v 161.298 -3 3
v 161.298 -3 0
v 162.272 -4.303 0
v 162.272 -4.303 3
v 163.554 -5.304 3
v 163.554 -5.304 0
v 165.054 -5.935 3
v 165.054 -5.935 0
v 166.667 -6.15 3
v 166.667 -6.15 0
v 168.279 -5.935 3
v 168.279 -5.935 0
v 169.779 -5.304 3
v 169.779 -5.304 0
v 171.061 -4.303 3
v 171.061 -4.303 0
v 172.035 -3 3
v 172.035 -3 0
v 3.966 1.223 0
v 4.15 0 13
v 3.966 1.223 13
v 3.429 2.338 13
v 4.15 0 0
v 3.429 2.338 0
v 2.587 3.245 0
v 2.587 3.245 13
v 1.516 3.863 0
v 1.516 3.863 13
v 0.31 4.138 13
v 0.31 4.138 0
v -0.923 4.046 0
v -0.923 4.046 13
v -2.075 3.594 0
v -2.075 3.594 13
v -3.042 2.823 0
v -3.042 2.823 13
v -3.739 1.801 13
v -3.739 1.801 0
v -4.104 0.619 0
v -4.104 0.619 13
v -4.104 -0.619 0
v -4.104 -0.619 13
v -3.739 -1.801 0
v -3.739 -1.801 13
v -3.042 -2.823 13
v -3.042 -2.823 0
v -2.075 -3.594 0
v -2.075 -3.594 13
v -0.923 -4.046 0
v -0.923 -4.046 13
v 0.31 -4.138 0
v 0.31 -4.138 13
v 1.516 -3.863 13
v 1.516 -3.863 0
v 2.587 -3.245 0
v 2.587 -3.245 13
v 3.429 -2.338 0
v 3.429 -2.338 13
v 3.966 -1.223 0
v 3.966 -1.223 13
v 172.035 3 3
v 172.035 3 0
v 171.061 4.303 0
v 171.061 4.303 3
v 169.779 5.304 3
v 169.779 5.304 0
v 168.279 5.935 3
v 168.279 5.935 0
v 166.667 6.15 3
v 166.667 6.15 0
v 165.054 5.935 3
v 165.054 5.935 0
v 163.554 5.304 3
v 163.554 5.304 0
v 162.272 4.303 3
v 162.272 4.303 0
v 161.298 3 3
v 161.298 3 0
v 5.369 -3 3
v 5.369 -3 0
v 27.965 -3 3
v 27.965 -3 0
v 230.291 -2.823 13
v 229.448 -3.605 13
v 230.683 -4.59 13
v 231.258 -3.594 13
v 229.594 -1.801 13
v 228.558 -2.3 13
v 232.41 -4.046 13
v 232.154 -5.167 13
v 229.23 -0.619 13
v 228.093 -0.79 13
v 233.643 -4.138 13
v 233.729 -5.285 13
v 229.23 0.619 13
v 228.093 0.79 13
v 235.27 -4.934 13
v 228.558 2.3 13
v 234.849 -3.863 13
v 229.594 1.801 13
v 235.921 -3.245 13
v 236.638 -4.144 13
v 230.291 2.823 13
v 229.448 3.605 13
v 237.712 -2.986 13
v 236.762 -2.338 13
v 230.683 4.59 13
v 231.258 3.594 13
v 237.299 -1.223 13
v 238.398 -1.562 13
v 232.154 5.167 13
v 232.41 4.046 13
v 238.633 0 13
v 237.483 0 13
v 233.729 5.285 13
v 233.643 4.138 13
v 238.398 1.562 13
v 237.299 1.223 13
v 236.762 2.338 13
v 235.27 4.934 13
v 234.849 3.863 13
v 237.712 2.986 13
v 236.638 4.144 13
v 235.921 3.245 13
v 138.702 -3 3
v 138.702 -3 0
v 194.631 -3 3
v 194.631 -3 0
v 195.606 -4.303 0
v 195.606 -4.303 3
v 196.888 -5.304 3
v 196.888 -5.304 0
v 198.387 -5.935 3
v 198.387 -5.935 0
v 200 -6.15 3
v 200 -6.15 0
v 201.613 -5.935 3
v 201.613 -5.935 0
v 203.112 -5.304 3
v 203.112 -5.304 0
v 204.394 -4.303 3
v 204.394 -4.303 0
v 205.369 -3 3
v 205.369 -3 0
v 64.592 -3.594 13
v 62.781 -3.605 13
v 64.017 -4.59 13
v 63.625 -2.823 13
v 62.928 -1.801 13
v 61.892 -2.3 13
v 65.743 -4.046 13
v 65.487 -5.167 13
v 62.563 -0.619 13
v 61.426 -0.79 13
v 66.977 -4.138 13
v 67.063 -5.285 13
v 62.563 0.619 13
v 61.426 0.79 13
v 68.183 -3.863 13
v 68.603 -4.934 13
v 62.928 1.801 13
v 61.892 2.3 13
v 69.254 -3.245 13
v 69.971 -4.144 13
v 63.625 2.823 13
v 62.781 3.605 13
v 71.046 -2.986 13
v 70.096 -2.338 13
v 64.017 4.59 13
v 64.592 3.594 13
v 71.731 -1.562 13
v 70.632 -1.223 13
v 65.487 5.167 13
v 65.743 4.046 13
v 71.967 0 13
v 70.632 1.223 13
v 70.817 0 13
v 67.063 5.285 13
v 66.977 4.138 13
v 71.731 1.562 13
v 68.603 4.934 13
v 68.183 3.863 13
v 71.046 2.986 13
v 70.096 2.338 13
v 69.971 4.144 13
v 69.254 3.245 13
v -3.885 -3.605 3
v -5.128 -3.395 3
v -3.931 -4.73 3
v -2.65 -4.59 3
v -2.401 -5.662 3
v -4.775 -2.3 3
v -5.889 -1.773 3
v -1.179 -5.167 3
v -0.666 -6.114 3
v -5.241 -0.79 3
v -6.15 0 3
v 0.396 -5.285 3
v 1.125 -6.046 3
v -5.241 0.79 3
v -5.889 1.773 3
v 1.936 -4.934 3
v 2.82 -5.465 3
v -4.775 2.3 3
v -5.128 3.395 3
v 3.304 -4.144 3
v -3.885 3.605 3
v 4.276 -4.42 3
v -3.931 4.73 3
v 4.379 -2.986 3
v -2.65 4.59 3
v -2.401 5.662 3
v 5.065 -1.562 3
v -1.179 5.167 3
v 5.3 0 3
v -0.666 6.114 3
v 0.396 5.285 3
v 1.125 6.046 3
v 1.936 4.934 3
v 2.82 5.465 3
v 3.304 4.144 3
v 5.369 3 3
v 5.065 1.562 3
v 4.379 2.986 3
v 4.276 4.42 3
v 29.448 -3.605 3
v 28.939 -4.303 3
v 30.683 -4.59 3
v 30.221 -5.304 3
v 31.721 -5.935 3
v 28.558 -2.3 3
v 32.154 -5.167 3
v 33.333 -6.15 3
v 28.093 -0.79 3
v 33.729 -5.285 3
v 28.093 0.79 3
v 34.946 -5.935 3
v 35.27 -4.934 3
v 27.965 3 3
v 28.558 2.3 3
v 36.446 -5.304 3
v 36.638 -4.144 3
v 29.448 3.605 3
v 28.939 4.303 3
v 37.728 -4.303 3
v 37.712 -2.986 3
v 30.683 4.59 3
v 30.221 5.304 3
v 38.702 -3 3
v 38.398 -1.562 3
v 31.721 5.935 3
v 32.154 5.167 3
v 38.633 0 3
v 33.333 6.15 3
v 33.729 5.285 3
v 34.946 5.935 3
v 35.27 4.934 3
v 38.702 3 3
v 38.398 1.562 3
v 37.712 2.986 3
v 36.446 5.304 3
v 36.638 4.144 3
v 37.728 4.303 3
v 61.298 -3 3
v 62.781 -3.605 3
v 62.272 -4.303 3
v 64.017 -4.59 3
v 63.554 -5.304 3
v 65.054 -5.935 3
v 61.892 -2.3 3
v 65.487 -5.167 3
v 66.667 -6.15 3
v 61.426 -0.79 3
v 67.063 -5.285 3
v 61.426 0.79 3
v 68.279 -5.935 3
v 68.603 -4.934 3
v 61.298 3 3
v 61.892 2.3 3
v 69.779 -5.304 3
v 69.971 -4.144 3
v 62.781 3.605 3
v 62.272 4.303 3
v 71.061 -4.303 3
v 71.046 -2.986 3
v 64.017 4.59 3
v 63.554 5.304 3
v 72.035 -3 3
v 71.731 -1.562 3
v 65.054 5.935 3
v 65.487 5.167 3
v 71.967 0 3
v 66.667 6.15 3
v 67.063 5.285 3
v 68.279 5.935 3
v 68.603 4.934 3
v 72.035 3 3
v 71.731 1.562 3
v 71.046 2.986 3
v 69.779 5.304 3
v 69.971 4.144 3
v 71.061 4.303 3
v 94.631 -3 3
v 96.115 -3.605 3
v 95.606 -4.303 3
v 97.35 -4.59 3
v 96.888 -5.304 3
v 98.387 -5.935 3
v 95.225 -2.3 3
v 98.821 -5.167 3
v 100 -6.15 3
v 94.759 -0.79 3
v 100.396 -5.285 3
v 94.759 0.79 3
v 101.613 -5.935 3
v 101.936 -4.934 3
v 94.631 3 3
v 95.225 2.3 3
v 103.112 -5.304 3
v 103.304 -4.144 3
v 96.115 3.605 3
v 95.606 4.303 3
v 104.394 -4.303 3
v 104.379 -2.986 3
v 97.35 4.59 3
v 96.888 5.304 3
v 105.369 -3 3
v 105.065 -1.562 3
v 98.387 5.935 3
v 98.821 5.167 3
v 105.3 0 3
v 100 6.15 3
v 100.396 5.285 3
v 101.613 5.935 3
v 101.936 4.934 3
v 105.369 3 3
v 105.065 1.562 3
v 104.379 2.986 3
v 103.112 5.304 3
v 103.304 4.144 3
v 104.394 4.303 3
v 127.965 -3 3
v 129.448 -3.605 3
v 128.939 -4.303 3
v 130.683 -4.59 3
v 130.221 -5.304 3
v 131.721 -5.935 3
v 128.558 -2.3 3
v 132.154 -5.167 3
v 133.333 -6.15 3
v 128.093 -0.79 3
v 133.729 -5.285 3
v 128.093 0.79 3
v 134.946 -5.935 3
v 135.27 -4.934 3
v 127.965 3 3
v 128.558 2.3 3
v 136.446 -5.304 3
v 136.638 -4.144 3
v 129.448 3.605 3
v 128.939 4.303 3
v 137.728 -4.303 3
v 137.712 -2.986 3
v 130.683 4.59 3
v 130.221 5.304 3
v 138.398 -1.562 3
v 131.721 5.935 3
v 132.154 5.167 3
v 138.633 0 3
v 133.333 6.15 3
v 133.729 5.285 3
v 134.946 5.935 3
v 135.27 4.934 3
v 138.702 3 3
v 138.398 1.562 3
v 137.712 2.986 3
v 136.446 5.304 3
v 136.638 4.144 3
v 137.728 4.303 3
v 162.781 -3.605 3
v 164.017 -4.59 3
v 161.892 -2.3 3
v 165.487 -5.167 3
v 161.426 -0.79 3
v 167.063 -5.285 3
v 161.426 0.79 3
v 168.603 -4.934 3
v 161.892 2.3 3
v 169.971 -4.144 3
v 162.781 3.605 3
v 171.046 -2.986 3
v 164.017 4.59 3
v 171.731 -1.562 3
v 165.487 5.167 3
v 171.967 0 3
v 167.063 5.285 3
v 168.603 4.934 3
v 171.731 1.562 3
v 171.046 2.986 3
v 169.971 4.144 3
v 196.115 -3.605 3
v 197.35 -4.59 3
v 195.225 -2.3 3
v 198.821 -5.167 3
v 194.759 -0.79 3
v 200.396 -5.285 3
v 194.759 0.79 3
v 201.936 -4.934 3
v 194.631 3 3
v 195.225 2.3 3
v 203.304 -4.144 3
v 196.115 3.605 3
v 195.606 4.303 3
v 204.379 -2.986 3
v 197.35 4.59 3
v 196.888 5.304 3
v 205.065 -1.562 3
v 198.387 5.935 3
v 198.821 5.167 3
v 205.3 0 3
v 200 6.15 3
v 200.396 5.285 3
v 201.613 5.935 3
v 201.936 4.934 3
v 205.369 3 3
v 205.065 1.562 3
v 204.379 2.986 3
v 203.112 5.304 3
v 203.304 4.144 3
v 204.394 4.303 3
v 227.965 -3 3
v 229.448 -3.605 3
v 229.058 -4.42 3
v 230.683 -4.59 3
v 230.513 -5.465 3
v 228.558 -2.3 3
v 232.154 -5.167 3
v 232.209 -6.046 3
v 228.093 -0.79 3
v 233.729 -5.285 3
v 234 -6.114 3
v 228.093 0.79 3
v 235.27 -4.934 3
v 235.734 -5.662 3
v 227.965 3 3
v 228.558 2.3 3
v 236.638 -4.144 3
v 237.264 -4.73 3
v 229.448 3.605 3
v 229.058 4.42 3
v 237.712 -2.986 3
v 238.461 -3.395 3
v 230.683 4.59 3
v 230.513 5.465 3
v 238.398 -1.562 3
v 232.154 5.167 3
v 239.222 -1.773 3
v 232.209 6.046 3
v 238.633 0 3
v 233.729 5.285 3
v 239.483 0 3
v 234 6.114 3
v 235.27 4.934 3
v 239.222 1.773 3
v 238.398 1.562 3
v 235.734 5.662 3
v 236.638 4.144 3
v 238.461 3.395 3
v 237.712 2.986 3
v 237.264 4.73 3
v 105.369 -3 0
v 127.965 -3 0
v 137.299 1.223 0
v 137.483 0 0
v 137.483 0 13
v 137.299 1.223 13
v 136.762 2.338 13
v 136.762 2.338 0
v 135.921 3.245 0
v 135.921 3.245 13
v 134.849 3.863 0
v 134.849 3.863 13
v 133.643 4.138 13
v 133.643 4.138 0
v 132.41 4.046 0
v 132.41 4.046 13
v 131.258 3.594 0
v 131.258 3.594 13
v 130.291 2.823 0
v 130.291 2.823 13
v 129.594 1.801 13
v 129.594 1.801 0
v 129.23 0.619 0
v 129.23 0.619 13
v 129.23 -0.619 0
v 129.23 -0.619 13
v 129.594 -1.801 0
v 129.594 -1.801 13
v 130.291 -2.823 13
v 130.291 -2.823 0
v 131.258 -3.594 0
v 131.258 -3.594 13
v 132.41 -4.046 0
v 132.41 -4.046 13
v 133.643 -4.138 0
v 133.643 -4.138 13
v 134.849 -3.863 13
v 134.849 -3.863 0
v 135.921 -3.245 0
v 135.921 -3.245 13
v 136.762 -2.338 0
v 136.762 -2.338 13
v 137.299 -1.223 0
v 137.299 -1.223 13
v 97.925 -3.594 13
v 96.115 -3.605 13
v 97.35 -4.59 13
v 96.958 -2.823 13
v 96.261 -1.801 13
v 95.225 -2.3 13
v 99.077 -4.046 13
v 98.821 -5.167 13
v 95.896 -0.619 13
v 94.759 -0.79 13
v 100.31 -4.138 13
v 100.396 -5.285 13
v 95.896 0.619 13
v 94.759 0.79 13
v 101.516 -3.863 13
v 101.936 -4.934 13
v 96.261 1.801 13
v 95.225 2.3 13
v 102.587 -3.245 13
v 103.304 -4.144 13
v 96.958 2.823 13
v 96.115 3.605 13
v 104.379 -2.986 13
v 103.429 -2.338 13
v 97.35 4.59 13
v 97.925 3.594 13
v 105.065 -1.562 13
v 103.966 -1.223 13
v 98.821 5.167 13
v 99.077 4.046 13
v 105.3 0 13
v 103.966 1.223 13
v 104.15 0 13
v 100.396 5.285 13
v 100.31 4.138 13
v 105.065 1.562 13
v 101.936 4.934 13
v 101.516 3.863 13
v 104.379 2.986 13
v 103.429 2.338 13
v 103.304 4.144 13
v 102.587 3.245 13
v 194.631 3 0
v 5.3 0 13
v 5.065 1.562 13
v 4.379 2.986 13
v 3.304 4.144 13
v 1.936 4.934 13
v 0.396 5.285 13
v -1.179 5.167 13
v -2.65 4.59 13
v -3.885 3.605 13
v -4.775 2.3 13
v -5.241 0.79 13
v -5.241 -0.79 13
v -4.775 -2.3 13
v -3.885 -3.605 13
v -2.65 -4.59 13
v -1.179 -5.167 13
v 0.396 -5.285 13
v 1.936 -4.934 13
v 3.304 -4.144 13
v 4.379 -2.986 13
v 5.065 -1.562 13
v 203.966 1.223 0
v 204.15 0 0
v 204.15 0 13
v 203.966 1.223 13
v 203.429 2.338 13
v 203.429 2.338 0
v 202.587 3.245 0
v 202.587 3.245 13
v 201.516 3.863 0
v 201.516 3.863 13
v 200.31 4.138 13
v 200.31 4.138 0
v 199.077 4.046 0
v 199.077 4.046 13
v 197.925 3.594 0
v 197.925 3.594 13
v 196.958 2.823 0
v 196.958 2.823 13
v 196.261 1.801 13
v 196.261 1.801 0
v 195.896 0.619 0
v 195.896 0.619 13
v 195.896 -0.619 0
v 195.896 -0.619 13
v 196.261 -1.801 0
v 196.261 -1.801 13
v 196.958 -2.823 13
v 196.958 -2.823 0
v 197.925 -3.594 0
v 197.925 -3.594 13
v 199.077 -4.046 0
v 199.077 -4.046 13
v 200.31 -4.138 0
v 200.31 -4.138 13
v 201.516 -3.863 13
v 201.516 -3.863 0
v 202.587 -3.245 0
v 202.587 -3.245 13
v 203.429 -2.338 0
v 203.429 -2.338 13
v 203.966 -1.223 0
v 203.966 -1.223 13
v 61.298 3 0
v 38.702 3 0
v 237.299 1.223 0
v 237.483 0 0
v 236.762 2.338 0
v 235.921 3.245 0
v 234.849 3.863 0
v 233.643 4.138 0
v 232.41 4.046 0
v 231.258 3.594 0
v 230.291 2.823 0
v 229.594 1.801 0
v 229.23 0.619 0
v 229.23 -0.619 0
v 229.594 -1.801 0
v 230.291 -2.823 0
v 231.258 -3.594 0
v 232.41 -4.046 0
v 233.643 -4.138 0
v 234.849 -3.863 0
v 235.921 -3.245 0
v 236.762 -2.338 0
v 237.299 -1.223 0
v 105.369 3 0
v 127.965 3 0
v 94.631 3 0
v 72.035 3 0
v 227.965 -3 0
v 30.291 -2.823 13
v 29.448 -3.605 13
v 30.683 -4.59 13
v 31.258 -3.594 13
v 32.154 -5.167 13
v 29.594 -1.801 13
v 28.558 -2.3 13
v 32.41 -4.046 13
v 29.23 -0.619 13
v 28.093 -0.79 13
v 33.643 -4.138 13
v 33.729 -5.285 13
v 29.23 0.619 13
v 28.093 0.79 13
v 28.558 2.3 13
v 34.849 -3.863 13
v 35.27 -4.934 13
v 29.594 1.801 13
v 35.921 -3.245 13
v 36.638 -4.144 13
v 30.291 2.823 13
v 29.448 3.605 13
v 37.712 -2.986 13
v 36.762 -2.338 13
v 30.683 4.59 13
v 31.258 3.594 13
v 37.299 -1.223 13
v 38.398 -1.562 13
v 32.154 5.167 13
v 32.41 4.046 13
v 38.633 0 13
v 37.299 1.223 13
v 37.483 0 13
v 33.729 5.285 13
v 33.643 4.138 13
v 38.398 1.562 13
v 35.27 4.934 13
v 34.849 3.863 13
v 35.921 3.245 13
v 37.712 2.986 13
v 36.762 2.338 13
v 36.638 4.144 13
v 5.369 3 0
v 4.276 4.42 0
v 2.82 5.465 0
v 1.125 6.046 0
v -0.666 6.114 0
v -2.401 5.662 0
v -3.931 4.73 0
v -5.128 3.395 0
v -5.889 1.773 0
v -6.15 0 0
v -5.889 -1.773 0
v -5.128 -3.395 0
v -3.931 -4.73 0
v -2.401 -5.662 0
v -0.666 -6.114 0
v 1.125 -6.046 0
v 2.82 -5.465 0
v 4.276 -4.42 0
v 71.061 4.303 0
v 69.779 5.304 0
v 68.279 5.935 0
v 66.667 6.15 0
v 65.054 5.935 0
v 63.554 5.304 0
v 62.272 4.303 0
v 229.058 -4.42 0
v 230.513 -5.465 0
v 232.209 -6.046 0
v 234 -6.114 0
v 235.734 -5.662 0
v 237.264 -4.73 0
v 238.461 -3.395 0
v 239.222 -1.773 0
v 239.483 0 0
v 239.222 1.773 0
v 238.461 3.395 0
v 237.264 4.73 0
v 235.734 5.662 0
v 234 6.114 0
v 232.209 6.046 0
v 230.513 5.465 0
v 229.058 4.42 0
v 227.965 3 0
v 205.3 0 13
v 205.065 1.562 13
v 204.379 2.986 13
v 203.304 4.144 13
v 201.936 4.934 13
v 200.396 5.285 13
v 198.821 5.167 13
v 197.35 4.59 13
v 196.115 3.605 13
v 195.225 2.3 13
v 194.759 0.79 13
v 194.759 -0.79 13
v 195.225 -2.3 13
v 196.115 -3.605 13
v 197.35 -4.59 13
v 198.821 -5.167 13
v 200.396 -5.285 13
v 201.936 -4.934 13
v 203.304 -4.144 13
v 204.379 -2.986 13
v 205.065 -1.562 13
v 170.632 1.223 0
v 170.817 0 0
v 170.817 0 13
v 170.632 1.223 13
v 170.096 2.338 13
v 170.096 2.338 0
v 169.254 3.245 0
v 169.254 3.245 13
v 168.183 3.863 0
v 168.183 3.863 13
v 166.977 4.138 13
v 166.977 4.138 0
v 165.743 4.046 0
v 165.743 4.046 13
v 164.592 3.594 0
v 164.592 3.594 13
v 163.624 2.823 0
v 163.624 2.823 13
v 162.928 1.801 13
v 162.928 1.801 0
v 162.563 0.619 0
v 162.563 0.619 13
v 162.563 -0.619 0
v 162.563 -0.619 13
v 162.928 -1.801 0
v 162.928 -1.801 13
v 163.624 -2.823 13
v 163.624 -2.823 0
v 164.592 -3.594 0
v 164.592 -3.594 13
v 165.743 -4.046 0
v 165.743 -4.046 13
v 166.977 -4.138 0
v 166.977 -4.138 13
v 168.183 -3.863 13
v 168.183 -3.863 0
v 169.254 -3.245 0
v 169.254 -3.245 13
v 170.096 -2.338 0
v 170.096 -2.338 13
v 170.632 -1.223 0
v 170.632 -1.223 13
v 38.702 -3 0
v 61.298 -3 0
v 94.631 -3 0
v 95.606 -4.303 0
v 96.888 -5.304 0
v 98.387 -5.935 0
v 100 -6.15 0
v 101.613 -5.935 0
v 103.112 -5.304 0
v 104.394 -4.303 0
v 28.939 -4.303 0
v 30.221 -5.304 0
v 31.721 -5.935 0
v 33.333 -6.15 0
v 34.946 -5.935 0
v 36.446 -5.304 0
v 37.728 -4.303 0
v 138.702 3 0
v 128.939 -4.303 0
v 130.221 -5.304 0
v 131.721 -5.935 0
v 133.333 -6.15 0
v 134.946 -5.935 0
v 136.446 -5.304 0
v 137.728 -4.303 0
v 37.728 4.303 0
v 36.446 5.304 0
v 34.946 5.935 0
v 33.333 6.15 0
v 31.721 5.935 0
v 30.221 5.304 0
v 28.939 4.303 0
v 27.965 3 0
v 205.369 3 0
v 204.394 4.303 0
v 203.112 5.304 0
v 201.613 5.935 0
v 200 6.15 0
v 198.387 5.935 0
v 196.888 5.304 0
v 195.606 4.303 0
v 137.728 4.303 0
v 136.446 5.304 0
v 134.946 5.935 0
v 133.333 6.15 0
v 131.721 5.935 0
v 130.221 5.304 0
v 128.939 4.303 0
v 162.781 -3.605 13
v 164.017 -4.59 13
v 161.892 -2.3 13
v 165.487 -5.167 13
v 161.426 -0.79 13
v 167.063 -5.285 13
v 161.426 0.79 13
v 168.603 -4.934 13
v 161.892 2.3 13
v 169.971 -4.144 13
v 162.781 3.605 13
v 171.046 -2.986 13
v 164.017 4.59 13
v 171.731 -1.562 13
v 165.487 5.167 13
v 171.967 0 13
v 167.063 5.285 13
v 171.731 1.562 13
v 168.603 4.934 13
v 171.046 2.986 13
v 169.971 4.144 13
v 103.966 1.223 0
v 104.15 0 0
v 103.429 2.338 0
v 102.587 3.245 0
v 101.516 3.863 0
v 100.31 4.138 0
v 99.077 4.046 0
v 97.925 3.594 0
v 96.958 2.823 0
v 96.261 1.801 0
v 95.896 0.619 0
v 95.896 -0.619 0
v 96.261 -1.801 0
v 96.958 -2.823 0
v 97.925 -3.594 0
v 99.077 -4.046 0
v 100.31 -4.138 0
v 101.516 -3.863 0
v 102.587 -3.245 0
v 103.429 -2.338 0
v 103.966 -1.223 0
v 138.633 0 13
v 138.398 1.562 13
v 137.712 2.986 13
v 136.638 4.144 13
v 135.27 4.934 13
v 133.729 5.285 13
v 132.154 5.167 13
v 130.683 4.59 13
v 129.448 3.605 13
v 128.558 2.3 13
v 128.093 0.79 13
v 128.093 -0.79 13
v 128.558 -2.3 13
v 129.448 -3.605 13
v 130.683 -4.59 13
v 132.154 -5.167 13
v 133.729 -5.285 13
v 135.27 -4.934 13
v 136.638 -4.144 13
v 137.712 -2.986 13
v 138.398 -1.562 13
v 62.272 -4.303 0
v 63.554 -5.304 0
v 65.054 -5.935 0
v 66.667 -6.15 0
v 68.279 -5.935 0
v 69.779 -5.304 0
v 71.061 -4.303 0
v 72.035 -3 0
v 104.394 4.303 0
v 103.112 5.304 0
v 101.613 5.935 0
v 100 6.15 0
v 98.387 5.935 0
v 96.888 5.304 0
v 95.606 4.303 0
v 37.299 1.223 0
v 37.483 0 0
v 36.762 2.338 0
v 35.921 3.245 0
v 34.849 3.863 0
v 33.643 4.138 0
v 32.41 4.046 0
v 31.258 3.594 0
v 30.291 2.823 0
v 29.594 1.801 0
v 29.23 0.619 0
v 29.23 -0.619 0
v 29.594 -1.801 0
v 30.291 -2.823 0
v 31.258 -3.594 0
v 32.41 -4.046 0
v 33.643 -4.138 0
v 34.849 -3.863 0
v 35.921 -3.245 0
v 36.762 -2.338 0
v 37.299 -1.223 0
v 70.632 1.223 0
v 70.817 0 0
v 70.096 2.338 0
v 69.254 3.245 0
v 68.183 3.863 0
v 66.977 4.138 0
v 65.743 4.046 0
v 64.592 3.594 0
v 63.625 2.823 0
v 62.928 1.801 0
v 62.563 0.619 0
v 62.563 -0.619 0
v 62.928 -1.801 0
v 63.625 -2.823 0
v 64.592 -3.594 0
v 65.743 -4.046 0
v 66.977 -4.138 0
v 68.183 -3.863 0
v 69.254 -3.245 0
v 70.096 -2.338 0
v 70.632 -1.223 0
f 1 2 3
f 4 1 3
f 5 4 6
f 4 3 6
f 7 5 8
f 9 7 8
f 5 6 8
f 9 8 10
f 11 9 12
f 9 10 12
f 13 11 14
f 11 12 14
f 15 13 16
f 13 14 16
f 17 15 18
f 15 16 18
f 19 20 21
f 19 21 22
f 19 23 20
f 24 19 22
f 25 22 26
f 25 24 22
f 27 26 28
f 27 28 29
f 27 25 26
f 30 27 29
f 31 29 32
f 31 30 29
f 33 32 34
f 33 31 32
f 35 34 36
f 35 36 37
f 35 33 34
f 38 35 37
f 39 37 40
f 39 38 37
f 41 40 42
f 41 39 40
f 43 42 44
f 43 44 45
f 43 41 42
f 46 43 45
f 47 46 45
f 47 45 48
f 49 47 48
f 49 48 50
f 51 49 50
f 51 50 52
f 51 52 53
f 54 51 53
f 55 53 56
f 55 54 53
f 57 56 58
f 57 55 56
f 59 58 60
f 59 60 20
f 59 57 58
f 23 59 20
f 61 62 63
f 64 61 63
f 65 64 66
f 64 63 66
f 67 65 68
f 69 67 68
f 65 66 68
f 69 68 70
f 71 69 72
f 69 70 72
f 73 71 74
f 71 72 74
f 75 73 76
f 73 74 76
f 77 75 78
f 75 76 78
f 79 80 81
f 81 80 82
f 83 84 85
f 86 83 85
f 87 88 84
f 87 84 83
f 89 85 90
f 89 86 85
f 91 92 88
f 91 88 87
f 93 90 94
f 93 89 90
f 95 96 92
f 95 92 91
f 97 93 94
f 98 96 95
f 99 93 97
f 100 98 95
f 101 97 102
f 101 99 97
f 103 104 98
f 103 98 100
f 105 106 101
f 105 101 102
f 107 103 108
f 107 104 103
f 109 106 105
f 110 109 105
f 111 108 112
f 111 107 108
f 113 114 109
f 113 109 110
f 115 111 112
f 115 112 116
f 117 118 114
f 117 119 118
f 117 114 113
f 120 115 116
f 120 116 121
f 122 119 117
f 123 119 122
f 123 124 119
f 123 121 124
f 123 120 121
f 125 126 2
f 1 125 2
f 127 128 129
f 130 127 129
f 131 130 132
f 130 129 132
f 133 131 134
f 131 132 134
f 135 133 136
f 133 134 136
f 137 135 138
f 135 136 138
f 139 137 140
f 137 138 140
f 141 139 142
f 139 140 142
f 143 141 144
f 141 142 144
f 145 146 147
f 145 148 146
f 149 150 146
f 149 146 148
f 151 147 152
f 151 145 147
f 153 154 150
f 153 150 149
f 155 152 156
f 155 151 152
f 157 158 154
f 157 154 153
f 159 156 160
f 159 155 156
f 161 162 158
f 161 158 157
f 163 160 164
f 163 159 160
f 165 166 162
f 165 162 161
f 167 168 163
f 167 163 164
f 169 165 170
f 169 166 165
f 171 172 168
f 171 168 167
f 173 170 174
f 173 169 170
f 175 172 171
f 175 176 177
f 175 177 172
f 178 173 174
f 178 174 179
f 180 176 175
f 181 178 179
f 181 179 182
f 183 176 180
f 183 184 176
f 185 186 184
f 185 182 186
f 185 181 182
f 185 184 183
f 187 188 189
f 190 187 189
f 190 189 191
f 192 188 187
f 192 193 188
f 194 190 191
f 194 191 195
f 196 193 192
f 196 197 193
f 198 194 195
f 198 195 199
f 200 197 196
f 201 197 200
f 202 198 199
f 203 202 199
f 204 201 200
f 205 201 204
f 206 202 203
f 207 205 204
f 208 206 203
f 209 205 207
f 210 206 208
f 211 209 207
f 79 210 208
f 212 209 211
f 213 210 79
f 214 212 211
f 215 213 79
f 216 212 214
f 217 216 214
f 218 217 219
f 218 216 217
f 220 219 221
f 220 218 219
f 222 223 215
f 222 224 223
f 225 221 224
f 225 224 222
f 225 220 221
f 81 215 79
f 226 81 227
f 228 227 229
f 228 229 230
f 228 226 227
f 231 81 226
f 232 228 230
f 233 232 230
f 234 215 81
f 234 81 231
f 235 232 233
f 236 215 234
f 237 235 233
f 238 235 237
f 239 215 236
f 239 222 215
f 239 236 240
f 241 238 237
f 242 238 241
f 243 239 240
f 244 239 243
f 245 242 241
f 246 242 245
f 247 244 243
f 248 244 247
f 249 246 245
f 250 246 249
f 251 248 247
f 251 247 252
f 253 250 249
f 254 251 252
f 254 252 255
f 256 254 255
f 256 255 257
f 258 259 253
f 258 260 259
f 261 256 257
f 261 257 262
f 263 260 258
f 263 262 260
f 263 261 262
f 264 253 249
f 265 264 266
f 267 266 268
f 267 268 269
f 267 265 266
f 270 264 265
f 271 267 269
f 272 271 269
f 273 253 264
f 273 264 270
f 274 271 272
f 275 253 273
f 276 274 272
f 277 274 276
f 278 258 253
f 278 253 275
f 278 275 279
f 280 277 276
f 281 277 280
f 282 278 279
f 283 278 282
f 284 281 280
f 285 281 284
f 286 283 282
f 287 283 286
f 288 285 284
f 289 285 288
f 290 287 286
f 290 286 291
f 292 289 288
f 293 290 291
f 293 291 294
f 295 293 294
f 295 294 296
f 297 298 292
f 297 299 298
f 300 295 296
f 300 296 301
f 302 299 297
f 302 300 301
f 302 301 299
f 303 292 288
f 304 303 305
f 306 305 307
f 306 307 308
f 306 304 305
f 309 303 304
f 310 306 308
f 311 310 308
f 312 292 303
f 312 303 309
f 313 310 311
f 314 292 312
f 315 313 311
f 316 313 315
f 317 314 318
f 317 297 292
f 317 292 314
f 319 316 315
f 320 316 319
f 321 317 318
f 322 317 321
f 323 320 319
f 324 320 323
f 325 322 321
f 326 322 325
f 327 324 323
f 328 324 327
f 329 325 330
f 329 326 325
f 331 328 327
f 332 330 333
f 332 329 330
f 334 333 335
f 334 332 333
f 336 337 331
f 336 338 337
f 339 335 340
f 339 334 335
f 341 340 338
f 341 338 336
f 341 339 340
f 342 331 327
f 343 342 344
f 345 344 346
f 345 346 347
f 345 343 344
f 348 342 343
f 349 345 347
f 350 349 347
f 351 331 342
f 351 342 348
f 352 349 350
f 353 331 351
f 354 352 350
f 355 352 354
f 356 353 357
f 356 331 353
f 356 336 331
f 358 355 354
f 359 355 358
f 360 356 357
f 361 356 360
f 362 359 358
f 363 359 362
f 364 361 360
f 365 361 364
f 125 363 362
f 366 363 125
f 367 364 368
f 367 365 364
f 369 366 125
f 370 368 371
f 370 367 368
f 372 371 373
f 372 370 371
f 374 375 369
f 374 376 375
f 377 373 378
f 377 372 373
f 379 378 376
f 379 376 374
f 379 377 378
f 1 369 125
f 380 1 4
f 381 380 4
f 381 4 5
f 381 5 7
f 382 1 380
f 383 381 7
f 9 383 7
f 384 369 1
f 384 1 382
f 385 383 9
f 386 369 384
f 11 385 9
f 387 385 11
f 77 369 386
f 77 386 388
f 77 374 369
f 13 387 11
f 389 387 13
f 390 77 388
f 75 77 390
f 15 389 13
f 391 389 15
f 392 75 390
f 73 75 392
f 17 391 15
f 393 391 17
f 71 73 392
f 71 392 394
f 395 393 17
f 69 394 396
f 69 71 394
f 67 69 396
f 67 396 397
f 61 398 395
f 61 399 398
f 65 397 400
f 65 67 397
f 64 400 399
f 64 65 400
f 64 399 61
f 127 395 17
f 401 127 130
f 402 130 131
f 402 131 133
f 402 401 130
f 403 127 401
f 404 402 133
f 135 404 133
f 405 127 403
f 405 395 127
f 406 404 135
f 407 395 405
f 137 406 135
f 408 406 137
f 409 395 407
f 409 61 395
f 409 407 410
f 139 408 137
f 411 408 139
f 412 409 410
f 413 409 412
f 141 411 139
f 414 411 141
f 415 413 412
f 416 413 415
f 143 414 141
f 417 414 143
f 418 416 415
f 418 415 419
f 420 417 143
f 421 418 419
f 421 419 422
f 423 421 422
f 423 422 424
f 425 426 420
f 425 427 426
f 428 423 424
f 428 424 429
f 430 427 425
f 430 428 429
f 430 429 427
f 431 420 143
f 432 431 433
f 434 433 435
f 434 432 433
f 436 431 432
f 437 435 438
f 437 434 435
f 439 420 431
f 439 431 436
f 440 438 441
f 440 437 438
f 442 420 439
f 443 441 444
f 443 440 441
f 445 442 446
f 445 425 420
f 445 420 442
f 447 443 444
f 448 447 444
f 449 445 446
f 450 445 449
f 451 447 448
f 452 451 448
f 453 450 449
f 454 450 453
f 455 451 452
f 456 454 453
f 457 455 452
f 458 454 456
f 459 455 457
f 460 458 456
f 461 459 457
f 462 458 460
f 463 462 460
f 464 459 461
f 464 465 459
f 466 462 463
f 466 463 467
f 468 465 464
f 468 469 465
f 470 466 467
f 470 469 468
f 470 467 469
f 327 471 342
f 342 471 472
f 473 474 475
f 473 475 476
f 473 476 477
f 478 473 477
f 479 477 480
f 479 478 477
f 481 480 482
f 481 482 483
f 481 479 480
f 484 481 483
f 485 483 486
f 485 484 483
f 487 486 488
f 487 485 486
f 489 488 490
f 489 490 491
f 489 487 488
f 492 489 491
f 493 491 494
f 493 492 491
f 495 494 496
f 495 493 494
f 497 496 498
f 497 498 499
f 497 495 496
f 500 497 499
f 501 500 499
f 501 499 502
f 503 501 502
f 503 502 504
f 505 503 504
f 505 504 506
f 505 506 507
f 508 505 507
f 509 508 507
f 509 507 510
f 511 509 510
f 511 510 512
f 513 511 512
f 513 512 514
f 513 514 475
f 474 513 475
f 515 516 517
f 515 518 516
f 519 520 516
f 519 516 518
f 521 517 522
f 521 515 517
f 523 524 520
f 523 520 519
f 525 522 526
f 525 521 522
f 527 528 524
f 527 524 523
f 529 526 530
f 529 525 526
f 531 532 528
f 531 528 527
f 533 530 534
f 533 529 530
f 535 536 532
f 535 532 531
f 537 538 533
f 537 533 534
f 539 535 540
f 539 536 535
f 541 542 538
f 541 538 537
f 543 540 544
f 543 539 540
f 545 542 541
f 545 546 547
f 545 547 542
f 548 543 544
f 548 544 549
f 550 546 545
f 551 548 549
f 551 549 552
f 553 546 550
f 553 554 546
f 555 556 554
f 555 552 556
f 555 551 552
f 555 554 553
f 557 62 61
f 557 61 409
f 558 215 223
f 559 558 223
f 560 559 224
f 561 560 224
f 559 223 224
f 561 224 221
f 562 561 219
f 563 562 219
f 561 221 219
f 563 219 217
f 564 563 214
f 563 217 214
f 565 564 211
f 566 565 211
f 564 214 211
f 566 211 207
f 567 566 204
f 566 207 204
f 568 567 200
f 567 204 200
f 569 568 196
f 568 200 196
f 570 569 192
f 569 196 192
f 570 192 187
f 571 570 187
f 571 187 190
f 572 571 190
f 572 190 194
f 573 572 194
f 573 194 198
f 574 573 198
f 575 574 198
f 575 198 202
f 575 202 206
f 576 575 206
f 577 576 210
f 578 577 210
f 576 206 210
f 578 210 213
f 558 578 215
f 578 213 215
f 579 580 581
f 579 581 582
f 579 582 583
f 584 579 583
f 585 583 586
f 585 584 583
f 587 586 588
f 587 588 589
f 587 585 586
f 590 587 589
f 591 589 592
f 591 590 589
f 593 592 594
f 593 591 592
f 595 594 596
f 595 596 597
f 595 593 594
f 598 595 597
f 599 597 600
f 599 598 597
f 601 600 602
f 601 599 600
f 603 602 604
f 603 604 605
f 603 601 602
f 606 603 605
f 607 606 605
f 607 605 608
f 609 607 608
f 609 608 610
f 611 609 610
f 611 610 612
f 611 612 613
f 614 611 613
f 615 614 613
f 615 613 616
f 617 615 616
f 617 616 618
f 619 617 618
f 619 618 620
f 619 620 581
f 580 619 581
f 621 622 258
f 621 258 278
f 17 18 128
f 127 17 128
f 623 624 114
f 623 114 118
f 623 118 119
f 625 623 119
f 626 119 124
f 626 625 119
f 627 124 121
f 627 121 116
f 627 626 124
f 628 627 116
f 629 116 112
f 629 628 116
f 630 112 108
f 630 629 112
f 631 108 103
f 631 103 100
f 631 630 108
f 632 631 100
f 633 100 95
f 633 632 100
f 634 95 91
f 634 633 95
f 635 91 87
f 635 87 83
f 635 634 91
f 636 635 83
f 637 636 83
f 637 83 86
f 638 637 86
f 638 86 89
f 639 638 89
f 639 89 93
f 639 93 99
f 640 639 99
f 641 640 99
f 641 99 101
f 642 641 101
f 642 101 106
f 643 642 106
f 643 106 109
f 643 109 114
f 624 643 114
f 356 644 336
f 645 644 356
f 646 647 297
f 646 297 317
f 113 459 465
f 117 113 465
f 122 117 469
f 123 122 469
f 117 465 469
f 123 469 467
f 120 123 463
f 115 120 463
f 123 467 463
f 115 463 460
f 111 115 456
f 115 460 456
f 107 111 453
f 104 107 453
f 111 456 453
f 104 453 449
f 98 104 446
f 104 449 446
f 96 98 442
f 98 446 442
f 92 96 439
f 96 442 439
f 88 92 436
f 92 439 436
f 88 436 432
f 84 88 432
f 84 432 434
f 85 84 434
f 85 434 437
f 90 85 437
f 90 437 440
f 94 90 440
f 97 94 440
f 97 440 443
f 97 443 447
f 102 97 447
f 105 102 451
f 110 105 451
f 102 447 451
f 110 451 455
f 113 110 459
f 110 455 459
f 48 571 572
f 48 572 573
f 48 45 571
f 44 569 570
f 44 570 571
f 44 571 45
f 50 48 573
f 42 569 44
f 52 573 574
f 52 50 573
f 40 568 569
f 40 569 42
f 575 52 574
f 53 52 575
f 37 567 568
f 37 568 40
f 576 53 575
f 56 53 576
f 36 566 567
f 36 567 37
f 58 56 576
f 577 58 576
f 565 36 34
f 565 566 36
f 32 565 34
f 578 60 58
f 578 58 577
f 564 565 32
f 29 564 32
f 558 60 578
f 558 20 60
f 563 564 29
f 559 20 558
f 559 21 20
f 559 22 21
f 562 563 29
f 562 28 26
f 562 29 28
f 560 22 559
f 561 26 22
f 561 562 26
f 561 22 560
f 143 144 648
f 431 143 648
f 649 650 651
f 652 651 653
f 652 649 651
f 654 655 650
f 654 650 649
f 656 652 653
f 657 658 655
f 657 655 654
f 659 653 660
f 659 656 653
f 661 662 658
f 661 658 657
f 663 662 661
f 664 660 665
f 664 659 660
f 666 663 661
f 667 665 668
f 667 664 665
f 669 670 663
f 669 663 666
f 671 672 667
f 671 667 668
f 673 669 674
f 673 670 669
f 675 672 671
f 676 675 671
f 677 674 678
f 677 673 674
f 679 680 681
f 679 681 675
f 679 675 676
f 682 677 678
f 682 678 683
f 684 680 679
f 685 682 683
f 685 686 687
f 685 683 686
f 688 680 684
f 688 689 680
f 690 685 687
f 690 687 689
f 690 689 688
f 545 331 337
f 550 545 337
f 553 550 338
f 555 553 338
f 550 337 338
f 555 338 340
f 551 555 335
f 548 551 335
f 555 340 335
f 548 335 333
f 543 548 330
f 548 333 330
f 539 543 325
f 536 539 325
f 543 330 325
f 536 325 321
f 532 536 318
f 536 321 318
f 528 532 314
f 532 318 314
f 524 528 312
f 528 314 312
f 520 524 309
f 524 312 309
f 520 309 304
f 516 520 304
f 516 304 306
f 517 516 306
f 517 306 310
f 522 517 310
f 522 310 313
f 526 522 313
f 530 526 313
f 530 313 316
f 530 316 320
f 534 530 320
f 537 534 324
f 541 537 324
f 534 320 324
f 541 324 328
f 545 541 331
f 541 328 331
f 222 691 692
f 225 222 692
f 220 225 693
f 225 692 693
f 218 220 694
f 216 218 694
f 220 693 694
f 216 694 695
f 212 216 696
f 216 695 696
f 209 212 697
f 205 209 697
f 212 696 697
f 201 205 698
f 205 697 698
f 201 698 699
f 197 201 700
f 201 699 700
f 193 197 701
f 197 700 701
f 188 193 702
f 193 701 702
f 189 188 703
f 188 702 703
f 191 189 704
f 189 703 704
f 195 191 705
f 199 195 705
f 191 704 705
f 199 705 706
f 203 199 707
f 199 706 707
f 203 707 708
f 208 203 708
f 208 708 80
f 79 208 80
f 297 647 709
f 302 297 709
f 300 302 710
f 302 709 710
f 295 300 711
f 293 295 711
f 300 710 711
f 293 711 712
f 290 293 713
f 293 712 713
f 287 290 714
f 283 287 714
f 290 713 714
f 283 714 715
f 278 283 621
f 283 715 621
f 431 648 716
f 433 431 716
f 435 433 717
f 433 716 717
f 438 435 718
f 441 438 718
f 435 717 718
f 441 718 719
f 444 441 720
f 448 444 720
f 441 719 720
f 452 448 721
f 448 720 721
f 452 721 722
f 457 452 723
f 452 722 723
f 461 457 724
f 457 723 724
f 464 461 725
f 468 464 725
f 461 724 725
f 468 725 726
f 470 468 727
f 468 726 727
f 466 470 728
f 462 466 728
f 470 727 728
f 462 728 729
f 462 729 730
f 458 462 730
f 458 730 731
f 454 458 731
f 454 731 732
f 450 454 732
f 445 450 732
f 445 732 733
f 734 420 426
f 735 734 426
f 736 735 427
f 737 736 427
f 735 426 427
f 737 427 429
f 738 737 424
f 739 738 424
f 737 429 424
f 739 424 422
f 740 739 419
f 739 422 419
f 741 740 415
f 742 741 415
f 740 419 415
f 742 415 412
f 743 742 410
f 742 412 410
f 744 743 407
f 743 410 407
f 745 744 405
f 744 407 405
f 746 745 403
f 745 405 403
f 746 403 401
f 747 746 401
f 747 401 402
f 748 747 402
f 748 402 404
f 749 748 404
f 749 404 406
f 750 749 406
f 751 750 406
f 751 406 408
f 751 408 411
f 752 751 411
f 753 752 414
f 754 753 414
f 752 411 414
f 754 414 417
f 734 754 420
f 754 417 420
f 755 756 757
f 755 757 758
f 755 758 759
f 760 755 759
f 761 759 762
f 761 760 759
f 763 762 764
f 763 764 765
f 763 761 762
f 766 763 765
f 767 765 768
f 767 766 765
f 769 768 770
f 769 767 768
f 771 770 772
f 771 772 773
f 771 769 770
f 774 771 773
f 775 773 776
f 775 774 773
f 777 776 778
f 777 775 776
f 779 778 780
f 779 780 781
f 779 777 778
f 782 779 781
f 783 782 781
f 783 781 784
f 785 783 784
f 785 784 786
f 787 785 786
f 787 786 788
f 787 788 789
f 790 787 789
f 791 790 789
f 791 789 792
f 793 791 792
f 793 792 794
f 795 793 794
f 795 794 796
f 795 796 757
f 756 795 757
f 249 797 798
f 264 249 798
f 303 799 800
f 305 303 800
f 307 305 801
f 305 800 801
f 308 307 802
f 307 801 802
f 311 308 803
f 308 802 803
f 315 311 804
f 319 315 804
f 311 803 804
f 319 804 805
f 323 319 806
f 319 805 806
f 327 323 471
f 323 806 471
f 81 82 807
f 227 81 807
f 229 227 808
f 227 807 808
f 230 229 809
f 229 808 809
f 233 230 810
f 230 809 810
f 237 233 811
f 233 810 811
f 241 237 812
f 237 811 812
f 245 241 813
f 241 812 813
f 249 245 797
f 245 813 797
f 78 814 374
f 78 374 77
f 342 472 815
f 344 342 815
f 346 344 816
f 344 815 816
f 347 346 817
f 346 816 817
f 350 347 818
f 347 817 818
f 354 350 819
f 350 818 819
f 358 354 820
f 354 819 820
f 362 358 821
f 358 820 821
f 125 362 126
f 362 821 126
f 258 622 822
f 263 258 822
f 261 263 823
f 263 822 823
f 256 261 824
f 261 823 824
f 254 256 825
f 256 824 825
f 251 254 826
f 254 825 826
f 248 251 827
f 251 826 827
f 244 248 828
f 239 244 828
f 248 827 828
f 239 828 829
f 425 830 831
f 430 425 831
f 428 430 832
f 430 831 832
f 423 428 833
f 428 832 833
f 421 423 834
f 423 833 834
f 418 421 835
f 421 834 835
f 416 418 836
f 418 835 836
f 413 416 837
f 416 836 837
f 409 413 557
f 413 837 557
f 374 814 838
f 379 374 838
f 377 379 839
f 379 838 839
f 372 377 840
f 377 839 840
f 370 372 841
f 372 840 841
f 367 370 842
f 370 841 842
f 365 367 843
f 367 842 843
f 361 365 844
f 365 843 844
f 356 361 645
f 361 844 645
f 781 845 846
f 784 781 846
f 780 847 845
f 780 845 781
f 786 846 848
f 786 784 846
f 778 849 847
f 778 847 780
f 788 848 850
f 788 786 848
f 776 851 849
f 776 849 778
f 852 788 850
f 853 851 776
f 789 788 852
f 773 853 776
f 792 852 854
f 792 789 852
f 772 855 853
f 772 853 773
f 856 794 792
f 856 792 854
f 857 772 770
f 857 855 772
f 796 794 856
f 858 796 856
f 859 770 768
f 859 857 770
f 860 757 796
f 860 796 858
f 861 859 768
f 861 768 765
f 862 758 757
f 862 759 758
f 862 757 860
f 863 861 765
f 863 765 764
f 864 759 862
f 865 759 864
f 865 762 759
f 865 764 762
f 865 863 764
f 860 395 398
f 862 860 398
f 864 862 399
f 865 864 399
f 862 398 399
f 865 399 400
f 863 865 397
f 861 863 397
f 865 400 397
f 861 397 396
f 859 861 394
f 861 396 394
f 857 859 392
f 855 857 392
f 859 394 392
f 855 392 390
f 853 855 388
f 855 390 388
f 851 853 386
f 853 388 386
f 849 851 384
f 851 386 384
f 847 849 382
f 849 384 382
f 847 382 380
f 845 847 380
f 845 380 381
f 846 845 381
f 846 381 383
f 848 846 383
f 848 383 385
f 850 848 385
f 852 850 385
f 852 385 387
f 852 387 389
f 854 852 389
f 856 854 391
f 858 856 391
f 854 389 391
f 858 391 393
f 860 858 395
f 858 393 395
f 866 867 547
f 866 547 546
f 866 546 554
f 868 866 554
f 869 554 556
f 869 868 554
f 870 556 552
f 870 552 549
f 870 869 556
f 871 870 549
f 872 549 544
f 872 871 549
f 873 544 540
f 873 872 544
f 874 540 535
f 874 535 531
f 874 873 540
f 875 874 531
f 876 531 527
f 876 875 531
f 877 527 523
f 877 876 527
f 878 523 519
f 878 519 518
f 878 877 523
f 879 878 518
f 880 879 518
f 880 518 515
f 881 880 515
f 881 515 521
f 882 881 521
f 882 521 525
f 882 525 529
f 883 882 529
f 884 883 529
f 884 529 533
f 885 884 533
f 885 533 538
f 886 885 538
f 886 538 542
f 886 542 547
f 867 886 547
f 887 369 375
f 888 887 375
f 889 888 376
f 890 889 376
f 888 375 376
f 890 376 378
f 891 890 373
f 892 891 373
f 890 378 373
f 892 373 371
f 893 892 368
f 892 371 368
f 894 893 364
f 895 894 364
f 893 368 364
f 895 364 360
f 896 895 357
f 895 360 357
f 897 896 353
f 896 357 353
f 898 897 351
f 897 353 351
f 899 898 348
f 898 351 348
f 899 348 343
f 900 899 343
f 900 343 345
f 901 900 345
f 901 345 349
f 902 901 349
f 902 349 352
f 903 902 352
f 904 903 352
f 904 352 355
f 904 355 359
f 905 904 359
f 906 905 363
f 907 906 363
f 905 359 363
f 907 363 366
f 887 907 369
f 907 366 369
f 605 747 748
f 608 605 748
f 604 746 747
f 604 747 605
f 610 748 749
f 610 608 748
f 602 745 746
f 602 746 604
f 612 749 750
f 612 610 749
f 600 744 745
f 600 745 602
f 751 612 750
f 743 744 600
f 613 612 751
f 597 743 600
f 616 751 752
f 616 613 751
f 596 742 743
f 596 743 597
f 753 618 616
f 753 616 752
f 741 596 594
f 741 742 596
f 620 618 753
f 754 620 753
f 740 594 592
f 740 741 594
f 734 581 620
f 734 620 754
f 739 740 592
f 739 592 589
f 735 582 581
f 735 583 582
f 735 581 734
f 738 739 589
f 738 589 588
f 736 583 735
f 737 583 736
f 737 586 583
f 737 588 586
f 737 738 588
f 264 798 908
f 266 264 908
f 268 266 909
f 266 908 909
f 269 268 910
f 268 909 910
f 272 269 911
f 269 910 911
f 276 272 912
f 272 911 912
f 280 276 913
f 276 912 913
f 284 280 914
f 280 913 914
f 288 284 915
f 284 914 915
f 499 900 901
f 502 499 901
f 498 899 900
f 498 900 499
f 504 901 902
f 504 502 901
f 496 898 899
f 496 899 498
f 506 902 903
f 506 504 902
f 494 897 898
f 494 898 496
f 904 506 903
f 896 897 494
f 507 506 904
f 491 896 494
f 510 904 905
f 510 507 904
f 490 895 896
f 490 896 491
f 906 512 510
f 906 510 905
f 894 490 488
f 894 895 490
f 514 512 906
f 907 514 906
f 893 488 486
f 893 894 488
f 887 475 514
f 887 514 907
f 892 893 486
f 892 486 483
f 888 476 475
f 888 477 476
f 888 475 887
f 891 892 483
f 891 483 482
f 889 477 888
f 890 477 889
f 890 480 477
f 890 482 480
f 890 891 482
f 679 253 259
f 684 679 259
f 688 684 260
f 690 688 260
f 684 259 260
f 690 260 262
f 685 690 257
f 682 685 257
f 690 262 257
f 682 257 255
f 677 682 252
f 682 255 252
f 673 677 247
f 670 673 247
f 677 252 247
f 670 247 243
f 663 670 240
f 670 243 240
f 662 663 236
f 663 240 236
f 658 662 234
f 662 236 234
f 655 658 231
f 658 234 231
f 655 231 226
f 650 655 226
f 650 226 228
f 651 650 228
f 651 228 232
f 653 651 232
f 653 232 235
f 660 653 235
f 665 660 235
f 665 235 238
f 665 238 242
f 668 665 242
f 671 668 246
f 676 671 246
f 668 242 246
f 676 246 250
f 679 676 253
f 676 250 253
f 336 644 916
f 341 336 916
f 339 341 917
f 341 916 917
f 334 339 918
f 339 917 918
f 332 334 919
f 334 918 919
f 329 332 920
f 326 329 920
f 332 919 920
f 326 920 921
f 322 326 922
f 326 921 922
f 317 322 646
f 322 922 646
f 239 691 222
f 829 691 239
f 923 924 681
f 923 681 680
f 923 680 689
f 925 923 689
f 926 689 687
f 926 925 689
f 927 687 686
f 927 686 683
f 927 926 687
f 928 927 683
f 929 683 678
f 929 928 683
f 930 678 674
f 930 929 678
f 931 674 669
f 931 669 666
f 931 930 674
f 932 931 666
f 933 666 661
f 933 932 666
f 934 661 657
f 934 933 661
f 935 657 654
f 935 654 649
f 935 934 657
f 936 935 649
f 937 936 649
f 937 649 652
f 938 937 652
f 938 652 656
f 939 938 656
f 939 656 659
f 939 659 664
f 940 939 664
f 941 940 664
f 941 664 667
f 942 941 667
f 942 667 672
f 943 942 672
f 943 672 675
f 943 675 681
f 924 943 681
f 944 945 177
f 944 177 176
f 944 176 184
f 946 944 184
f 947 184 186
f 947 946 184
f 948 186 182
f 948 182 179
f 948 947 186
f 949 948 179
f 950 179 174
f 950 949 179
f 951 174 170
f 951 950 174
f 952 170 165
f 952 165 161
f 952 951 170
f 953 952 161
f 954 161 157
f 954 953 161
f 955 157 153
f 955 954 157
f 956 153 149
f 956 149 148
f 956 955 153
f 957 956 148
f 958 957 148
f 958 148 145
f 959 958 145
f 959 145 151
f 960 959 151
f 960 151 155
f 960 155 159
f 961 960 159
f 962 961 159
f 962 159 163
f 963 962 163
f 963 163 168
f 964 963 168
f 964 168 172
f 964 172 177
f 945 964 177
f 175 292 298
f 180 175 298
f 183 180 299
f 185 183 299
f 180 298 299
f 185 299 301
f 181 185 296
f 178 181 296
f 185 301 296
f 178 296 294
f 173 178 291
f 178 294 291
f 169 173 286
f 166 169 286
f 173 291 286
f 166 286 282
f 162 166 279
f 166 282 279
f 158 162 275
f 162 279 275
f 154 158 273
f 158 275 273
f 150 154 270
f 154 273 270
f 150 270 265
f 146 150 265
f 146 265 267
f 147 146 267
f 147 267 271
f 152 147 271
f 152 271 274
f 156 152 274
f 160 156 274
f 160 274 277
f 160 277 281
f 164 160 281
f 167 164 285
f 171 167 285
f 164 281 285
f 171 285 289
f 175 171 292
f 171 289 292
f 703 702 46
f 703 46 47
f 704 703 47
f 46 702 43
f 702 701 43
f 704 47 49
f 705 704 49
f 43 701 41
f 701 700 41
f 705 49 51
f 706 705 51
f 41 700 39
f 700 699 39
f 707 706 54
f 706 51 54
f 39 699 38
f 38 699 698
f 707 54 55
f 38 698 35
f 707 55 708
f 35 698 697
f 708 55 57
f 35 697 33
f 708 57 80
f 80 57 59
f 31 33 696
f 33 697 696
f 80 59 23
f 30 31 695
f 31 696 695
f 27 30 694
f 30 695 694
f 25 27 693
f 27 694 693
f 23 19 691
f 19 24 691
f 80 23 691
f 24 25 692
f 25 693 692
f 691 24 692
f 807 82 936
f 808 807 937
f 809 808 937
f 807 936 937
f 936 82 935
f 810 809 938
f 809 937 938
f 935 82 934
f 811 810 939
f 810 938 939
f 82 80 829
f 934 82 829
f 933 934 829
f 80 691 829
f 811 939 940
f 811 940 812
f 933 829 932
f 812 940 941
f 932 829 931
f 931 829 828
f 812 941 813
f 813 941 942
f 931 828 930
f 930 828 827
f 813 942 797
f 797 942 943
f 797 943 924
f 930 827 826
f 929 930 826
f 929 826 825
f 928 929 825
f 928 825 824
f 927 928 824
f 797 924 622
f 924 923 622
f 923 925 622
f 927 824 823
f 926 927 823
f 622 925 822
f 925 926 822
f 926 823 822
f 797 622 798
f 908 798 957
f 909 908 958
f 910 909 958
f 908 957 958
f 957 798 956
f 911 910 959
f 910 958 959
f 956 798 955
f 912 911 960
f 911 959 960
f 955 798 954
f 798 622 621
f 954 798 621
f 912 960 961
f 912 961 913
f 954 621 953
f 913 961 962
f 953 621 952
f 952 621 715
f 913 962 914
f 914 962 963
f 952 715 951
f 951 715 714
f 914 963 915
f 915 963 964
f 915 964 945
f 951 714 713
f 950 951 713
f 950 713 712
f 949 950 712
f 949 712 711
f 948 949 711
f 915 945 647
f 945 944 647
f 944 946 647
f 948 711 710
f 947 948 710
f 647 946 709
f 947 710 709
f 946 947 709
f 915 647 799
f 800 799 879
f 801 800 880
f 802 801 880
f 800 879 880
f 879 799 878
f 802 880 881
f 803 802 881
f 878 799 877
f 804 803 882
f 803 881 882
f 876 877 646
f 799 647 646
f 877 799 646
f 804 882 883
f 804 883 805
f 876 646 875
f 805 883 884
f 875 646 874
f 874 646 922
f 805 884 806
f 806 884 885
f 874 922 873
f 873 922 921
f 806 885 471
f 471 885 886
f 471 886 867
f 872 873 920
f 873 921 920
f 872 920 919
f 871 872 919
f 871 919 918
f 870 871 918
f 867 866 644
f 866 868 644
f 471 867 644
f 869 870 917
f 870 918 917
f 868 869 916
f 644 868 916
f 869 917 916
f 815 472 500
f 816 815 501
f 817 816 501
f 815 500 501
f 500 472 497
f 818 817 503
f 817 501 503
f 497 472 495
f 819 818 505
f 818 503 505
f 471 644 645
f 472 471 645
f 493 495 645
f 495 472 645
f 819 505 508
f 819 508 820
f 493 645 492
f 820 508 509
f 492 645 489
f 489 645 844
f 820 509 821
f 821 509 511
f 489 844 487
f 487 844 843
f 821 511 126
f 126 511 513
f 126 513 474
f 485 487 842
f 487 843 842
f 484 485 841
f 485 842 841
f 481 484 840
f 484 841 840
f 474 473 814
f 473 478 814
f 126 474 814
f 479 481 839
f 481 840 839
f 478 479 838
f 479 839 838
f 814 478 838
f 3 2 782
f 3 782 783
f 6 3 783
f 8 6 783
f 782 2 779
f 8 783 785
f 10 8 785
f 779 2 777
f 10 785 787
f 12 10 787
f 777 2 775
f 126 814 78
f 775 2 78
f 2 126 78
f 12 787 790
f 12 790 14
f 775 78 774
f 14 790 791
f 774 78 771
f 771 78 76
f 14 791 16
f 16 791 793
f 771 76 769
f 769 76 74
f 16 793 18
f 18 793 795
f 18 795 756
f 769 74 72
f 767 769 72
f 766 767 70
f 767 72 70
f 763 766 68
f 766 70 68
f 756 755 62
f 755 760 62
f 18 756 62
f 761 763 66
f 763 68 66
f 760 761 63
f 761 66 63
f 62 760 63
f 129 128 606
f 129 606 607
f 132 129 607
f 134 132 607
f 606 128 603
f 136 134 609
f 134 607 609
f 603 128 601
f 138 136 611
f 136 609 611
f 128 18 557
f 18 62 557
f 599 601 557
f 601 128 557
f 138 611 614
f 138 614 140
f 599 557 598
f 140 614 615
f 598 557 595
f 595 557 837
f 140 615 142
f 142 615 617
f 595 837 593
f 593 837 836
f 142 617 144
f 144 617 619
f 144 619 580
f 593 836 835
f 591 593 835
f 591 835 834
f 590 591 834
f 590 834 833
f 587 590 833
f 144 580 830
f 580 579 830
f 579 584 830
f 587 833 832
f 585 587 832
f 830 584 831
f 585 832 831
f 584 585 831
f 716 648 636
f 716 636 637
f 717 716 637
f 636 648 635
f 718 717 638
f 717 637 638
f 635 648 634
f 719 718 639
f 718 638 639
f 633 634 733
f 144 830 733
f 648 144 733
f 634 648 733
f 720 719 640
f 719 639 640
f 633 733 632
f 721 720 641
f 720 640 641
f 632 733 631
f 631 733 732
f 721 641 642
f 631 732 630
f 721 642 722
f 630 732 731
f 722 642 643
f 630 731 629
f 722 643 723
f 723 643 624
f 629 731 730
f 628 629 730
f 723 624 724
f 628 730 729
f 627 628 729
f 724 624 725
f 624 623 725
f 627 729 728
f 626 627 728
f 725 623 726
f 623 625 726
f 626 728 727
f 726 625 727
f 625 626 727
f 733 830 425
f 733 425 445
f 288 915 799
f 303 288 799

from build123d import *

# Parameters (mm, degrees)
SKETCH_R      = 4.15
PAD_DEPTH     = 3
SKETCH001_R   = 5.3
SKETCH001_R_2 = 4.15
PAD001_DEPTH  = 10


with BuildPart() as part:
    # Sketch → Pad (new body)
    with BuildSketch(Plane.XY):
        with BuildLine():
            Line((5.368659, -3), (27.964674, -3))
            ThreePointArc((27.964674, -3), (33.333333, -6.15), (38.701992, -3))
            Line((38.701992, -3), (61.298007, -3))
            ThreePointArc((61.298007, -3), (66.666666, -6.15), (72.035325, -3))
            Line((72.035325, -3), (94.63134, -3))
            ThreePointArc((94.63134, -3), (99.999999, -6.15), (105.368658, -3))
            Line((105.368658, -3), (127.964673, -3))
            ThreePointArc((127.964673, -3), (133.333332, -6.15), (138.701991, -3))
            Line((138.701991, -3), (161.298006, -3))
            ThreePointArc((161.298006, -3), (166.666665, -6.15), (172.035324, -3))
            Line((172.035324, -3), (194.631339, -3))
            ThreePointArc((194.631339, -3), (199.999998, -6.15), (205.368657, -3))
            Line((205.368657, -3), (227.964672, -3))
            ThreePointArc((227.964672, -3), (239.483331, 0), (227.964672, 3))
            Line((205.368657, 3), (227.964672, 3))
            ThreePointArc((205.368657, 3), (199.999998, 6.15), (194.631339, 3))
            Line((172.035324, 3), (194.631339, 3))
            ThreePointArc((172.035324, 3), (166.666665, 6.15), (161.298006, 3))
            Line((138.701991, 3), (161.298006, 3))
            ThreePointArc((138.701991, 3), (133.333332, 6.15), (127.964673, 3))
            Line((105.368658, 3), (127.964673, 3))
            ThreePointArc((105.368658, 3), (99.999999, 6.15), (94.63134, 3))
            Line((72.035325, 3), (94.63134, 3))
            ThreePointArc((72.035325, 3), (66.666666, 6.15), (61.298007, 3))
            Line((38.701992, 3), (61.298007, 3))
            ThreePointArc((38.701992, 3), (33.333333, 6.15), (27.964674, 3))
            Line((5.368659, 3), (27.964674, 3))
            ThreePointArc((5.368659, 3), (-6.15, 0), (5.368659, -3))
        make_face()
        Circle(SKETCH_R, mode=Mode.SUBTRACT)
        with Locations((33.333333, 0)):
            Circle(SKETCH_R, mode=Mode.SUBTRACT)
        with Locations((66.666666, 0)):
            Circle(SKETCH_R, mode=Mode.SUBTRACT)
        with Locations((99.999999, 0)):
            Circle(SKETCH_R, mode=Mode.SUBTRACT)
        with Locations((133.333332, 0)):
            Circle(SKETCH_R, mode=Mode.SUBTRACT)
        with Locations((166.666665, 0)):
            Circle(SKETCH_R, mode=Mode.SUBTRACT)
        with Locations((199.999998, 0)):
            Circle(SKETCH_R, mode=Mode.SUBTRACT)
        with Locations((233.333331, 0)):
            Circle(SKETCH_R, mode=Mode.SUBTRACT)
    extrude(amount=PAD_DEPTH)

    # Sketch001 (on Face38 of Pad) → Pad001 (join)
    with BuildSketch(Plane.XY.offset(3)):
        Circle(SKETCH001_R)
        Circle(SKETCH001_R_2, mode=Mode.SUBTRACT)
        with Locations((33.333333, 0)):
            Circle(SKETCH001_R)
        with Locations((33.333333, 0)):
            Circle(SKETCH001_R_2, mode=Mode.SUBTRACT)
        with Locations((66.666666, 0)):
            Circle(SKETCH001_R)
        with Locations((66.666666, 0)):
            Circle(SKETCH001_R_2, mode=Mode.SUBTRACT)
        with Locations((99.999999, 0)):
            Circle(SKETCH001_R)
        with Locations((99.999999, 0)):
            Circle(SKETCH001_R_2, mode=Mode.SUBTRACT)
        with Locations((133.333332, 0)):
            Circle(SKETCH001_R)
        with Locations((133.333332, 0)):
            Circle(SKETCH001_R_2, mode=Mode.SUBTRACT)
        with Locations((166.666665, 0)):
            Circle(SKETCH001_R)
        with Locations((166.666665, 0)):
            Circle(SKETCH001_R_2, mode=Mode.SUBTRACT)
        with Locations((199.999998, 0)):
            Circle(SKETCH001_R)
        with Locations((199.999998, 0)):
            Circle(SKETCH001_R_2, mode=Mode.SUBTRACT)
        with Locations((233.333331, 0)):
            Circle(SKETCH001_R)
        with Locations((233.333331, 0)):
            Circle(SKETCH001_R_2, mode=Mode.SUBTRACT)
    extrude(amount=PAD001_DEPTH)


solid = part.part
